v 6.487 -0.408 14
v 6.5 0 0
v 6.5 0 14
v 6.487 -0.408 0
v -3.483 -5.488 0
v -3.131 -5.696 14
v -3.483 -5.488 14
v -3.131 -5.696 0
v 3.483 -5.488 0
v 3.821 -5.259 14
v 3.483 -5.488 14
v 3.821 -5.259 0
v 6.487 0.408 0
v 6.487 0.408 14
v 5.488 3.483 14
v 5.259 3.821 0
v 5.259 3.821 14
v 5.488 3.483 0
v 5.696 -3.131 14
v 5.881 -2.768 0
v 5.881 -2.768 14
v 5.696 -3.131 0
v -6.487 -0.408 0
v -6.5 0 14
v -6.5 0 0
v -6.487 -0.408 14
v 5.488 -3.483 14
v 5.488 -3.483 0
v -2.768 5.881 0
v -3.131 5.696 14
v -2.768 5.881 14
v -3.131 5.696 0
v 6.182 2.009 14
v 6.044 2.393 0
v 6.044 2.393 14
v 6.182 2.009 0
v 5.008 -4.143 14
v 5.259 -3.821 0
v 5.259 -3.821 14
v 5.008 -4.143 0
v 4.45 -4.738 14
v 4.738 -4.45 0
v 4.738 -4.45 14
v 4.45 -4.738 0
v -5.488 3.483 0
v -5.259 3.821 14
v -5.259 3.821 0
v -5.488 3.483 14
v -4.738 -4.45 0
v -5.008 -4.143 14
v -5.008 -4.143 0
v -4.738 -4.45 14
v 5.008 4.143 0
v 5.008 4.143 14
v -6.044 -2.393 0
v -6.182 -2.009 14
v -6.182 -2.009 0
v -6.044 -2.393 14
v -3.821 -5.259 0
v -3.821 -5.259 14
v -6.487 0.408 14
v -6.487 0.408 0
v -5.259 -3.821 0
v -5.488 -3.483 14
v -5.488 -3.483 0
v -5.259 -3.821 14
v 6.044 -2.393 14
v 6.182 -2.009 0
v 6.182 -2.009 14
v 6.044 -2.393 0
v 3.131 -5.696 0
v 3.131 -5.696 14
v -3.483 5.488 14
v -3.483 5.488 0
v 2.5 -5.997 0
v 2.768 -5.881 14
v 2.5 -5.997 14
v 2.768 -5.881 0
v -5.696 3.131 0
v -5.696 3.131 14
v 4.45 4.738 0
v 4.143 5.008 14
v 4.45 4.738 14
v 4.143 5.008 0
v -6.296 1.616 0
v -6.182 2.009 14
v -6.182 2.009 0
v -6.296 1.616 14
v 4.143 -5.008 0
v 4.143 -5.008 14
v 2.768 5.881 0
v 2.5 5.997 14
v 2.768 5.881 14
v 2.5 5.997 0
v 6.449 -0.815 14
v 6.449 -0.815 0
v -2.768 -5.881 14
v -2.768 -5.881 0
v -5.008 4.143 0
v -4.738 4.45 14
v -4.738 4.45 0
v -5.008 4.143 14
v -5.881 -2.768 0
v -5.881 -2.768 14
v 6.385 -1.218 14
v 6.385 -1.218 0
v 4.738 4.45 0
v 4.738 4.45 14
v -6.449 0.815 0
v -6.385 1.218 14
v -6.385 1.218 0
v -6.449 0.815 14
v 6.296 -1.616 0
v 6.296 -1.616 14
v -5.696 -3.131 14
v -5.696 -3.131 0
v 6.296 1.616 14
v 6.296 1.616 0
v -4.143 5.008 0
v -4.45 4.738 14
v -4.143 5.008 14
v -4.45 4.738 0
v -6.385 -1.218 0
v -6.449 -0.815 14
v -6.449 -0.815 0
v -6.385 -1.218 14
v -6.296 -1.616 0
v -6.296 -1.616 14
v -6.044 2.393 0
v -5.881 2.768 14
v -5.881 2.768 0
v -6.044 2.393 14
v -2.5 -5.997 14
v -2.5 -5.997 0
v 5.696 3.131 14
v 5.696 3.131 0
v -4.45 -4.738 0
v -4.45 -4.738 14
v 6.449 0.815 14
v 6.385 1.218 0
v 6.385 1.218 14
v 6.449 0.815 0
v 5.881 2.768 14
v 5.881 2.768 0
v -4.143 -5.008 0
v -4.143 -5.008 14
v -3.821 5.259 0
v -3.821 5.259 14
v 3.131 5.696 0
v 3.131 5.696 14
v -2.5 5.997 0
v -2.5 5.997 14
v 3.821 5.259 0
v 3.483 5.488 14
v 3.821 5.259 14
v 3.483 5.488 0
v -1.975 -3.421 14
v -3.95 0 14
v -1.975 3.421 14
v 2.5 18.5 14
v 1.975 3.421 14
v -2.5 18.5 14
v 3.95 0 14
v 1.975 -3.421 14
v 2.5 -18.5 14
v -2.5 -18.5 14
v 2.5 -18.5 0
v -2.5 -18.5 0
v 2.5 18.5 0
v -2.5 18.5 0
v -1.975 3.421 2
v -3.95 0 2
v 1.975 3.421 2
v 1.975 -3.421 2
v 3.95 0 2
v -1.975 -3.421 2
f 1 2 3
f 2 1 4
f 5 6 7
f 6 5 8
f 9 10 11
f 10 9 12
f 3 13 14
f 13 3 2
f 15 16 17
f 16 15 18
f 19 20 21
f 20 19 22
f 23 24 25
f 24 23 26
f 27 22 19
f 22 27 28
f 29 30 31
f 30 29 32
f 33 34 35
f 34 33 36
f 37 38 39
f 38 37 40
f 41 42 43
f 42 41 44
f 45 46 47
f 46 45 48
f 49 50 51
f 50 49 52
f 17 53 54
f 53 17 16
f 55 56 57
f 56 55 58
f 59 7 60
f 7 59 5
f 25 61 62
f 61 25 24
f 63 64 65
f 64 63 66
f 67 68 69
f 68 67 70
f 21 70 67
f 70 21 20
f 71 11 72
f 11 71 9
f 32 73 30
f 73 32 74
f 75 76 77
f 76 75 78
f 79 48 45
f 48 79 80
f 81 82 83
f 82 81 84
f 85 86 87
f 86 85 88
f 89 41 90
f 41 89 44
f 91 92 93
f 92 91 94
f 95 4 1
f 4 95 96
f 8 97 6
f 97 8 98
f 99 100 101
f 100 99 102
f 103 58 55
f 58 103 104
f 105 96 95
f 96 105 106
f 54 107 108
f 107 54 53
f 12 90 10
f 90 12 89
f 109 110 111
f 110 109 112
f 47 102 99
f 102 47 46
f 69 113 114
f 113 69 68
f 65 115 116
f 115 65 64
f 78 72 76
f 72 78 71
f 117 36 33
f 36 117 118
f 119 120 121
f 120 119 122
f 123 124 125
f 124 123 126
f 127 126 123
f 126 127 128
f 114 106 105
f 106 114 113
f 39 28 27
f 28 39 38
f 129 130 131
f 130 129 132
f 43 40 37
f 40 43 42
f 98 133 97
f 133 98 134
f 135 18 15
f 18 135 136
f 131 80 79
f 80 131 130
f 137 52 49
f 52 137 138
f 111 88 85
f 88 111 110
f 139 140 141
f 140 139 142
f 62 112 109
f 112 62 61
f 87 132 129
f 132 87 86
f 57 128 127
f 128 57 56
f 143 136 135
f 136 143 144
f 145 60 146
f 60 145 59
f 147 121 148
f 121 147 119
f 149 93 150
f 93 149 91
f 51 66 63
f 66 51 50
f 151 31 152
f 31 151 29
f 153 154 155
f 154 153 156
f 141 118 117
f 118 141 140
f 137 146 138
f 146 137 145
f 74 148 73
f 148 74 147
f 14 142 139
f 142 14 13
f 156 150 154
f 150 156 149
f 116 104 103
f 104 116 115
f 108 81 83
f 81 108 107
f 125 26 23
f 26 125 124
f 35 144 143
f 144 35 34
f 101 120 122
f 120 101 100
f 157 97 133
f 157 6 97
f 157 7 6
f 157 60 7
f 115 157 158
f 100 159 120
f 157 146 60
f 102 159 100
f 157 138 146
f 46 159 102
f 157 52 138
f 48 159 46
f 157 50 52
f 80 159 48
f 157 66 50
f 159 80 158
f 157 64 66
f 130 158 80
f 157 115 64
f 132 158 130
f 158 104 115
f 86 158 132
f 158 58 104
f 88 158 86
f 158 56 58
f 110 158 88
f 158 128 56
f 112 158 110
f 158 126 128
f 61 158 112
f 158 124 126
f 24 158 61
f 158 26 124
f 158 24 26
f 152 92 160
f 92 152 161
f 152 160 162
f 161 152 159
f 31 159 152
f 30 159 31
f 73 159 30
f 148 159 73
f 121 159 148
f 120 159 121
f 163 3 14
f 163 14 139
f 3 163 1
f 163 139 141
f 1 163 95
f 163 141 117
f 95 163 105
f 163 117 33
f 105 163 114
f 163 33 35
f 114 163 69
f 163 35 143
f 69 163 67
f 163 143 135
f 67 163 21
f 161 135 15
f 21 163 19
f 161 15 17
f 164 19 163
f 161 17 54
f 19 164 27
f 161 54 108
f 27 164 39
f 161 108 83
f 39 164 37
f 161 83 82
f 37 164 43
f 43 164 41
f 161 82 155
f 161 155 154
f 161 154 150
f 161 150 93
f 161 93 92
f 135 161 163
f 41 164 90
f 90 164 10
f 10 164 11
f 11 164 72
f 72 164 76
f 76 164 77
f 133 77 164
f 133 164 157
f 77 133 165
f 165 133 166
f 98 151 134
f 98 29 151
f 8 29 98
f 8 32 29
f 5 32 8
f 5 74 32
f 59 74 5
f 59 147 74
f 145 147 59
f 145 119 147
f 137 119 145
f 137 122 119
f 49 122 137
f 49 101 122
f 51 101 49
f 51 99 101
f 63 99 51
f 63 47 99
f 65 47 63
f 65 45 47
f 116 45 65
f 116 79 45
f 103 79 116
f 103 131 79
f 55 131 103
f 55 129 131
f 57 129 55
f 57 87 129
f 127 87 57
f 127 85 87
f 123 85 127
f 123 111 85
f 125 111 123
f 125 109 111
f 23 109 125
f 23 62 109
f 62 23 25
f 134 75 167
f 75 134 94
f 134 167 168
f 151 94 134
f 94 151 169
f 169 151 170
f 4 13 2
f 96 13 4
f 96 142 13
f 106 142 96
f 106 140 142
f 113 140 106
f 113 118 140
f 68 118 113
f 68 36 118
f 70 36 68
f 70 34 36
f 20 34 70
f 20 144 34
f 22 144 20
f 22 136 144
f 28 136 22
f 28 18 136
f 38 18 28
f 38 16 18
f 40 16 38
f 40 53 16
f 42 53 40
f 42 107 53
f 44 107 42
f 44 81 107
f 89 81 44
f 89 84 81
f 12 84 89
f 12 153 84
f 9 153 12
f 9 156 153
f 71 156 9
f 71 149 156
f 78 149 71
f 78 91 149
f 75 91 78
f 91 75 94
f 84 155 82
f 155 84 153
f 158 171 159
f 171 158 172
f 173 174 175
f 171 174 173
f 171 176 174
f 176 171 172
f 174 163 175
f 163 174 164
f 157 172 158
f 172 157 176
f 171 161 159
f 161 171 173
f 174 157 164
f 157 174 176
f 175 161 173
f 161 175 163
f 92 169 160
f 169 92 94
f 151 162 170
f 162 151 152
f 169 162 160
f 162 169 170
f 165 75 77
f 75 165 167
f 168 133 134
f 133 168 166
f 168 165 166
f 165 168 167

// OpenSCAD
difference(){
{
  linear_extrude(height = 14)
  circle(r=13/2,$fn=100);
}

{
translate([0,0,2]){
linear_extrude(height = 16)
   circle(r=7.9/2,$fn=6);
}}
}

translate([0,11,7]){
cube(size = [5,15,14], center = true);
}


translate([0,-11,7]){
cube(size = [5,15,14], center = true);
}
